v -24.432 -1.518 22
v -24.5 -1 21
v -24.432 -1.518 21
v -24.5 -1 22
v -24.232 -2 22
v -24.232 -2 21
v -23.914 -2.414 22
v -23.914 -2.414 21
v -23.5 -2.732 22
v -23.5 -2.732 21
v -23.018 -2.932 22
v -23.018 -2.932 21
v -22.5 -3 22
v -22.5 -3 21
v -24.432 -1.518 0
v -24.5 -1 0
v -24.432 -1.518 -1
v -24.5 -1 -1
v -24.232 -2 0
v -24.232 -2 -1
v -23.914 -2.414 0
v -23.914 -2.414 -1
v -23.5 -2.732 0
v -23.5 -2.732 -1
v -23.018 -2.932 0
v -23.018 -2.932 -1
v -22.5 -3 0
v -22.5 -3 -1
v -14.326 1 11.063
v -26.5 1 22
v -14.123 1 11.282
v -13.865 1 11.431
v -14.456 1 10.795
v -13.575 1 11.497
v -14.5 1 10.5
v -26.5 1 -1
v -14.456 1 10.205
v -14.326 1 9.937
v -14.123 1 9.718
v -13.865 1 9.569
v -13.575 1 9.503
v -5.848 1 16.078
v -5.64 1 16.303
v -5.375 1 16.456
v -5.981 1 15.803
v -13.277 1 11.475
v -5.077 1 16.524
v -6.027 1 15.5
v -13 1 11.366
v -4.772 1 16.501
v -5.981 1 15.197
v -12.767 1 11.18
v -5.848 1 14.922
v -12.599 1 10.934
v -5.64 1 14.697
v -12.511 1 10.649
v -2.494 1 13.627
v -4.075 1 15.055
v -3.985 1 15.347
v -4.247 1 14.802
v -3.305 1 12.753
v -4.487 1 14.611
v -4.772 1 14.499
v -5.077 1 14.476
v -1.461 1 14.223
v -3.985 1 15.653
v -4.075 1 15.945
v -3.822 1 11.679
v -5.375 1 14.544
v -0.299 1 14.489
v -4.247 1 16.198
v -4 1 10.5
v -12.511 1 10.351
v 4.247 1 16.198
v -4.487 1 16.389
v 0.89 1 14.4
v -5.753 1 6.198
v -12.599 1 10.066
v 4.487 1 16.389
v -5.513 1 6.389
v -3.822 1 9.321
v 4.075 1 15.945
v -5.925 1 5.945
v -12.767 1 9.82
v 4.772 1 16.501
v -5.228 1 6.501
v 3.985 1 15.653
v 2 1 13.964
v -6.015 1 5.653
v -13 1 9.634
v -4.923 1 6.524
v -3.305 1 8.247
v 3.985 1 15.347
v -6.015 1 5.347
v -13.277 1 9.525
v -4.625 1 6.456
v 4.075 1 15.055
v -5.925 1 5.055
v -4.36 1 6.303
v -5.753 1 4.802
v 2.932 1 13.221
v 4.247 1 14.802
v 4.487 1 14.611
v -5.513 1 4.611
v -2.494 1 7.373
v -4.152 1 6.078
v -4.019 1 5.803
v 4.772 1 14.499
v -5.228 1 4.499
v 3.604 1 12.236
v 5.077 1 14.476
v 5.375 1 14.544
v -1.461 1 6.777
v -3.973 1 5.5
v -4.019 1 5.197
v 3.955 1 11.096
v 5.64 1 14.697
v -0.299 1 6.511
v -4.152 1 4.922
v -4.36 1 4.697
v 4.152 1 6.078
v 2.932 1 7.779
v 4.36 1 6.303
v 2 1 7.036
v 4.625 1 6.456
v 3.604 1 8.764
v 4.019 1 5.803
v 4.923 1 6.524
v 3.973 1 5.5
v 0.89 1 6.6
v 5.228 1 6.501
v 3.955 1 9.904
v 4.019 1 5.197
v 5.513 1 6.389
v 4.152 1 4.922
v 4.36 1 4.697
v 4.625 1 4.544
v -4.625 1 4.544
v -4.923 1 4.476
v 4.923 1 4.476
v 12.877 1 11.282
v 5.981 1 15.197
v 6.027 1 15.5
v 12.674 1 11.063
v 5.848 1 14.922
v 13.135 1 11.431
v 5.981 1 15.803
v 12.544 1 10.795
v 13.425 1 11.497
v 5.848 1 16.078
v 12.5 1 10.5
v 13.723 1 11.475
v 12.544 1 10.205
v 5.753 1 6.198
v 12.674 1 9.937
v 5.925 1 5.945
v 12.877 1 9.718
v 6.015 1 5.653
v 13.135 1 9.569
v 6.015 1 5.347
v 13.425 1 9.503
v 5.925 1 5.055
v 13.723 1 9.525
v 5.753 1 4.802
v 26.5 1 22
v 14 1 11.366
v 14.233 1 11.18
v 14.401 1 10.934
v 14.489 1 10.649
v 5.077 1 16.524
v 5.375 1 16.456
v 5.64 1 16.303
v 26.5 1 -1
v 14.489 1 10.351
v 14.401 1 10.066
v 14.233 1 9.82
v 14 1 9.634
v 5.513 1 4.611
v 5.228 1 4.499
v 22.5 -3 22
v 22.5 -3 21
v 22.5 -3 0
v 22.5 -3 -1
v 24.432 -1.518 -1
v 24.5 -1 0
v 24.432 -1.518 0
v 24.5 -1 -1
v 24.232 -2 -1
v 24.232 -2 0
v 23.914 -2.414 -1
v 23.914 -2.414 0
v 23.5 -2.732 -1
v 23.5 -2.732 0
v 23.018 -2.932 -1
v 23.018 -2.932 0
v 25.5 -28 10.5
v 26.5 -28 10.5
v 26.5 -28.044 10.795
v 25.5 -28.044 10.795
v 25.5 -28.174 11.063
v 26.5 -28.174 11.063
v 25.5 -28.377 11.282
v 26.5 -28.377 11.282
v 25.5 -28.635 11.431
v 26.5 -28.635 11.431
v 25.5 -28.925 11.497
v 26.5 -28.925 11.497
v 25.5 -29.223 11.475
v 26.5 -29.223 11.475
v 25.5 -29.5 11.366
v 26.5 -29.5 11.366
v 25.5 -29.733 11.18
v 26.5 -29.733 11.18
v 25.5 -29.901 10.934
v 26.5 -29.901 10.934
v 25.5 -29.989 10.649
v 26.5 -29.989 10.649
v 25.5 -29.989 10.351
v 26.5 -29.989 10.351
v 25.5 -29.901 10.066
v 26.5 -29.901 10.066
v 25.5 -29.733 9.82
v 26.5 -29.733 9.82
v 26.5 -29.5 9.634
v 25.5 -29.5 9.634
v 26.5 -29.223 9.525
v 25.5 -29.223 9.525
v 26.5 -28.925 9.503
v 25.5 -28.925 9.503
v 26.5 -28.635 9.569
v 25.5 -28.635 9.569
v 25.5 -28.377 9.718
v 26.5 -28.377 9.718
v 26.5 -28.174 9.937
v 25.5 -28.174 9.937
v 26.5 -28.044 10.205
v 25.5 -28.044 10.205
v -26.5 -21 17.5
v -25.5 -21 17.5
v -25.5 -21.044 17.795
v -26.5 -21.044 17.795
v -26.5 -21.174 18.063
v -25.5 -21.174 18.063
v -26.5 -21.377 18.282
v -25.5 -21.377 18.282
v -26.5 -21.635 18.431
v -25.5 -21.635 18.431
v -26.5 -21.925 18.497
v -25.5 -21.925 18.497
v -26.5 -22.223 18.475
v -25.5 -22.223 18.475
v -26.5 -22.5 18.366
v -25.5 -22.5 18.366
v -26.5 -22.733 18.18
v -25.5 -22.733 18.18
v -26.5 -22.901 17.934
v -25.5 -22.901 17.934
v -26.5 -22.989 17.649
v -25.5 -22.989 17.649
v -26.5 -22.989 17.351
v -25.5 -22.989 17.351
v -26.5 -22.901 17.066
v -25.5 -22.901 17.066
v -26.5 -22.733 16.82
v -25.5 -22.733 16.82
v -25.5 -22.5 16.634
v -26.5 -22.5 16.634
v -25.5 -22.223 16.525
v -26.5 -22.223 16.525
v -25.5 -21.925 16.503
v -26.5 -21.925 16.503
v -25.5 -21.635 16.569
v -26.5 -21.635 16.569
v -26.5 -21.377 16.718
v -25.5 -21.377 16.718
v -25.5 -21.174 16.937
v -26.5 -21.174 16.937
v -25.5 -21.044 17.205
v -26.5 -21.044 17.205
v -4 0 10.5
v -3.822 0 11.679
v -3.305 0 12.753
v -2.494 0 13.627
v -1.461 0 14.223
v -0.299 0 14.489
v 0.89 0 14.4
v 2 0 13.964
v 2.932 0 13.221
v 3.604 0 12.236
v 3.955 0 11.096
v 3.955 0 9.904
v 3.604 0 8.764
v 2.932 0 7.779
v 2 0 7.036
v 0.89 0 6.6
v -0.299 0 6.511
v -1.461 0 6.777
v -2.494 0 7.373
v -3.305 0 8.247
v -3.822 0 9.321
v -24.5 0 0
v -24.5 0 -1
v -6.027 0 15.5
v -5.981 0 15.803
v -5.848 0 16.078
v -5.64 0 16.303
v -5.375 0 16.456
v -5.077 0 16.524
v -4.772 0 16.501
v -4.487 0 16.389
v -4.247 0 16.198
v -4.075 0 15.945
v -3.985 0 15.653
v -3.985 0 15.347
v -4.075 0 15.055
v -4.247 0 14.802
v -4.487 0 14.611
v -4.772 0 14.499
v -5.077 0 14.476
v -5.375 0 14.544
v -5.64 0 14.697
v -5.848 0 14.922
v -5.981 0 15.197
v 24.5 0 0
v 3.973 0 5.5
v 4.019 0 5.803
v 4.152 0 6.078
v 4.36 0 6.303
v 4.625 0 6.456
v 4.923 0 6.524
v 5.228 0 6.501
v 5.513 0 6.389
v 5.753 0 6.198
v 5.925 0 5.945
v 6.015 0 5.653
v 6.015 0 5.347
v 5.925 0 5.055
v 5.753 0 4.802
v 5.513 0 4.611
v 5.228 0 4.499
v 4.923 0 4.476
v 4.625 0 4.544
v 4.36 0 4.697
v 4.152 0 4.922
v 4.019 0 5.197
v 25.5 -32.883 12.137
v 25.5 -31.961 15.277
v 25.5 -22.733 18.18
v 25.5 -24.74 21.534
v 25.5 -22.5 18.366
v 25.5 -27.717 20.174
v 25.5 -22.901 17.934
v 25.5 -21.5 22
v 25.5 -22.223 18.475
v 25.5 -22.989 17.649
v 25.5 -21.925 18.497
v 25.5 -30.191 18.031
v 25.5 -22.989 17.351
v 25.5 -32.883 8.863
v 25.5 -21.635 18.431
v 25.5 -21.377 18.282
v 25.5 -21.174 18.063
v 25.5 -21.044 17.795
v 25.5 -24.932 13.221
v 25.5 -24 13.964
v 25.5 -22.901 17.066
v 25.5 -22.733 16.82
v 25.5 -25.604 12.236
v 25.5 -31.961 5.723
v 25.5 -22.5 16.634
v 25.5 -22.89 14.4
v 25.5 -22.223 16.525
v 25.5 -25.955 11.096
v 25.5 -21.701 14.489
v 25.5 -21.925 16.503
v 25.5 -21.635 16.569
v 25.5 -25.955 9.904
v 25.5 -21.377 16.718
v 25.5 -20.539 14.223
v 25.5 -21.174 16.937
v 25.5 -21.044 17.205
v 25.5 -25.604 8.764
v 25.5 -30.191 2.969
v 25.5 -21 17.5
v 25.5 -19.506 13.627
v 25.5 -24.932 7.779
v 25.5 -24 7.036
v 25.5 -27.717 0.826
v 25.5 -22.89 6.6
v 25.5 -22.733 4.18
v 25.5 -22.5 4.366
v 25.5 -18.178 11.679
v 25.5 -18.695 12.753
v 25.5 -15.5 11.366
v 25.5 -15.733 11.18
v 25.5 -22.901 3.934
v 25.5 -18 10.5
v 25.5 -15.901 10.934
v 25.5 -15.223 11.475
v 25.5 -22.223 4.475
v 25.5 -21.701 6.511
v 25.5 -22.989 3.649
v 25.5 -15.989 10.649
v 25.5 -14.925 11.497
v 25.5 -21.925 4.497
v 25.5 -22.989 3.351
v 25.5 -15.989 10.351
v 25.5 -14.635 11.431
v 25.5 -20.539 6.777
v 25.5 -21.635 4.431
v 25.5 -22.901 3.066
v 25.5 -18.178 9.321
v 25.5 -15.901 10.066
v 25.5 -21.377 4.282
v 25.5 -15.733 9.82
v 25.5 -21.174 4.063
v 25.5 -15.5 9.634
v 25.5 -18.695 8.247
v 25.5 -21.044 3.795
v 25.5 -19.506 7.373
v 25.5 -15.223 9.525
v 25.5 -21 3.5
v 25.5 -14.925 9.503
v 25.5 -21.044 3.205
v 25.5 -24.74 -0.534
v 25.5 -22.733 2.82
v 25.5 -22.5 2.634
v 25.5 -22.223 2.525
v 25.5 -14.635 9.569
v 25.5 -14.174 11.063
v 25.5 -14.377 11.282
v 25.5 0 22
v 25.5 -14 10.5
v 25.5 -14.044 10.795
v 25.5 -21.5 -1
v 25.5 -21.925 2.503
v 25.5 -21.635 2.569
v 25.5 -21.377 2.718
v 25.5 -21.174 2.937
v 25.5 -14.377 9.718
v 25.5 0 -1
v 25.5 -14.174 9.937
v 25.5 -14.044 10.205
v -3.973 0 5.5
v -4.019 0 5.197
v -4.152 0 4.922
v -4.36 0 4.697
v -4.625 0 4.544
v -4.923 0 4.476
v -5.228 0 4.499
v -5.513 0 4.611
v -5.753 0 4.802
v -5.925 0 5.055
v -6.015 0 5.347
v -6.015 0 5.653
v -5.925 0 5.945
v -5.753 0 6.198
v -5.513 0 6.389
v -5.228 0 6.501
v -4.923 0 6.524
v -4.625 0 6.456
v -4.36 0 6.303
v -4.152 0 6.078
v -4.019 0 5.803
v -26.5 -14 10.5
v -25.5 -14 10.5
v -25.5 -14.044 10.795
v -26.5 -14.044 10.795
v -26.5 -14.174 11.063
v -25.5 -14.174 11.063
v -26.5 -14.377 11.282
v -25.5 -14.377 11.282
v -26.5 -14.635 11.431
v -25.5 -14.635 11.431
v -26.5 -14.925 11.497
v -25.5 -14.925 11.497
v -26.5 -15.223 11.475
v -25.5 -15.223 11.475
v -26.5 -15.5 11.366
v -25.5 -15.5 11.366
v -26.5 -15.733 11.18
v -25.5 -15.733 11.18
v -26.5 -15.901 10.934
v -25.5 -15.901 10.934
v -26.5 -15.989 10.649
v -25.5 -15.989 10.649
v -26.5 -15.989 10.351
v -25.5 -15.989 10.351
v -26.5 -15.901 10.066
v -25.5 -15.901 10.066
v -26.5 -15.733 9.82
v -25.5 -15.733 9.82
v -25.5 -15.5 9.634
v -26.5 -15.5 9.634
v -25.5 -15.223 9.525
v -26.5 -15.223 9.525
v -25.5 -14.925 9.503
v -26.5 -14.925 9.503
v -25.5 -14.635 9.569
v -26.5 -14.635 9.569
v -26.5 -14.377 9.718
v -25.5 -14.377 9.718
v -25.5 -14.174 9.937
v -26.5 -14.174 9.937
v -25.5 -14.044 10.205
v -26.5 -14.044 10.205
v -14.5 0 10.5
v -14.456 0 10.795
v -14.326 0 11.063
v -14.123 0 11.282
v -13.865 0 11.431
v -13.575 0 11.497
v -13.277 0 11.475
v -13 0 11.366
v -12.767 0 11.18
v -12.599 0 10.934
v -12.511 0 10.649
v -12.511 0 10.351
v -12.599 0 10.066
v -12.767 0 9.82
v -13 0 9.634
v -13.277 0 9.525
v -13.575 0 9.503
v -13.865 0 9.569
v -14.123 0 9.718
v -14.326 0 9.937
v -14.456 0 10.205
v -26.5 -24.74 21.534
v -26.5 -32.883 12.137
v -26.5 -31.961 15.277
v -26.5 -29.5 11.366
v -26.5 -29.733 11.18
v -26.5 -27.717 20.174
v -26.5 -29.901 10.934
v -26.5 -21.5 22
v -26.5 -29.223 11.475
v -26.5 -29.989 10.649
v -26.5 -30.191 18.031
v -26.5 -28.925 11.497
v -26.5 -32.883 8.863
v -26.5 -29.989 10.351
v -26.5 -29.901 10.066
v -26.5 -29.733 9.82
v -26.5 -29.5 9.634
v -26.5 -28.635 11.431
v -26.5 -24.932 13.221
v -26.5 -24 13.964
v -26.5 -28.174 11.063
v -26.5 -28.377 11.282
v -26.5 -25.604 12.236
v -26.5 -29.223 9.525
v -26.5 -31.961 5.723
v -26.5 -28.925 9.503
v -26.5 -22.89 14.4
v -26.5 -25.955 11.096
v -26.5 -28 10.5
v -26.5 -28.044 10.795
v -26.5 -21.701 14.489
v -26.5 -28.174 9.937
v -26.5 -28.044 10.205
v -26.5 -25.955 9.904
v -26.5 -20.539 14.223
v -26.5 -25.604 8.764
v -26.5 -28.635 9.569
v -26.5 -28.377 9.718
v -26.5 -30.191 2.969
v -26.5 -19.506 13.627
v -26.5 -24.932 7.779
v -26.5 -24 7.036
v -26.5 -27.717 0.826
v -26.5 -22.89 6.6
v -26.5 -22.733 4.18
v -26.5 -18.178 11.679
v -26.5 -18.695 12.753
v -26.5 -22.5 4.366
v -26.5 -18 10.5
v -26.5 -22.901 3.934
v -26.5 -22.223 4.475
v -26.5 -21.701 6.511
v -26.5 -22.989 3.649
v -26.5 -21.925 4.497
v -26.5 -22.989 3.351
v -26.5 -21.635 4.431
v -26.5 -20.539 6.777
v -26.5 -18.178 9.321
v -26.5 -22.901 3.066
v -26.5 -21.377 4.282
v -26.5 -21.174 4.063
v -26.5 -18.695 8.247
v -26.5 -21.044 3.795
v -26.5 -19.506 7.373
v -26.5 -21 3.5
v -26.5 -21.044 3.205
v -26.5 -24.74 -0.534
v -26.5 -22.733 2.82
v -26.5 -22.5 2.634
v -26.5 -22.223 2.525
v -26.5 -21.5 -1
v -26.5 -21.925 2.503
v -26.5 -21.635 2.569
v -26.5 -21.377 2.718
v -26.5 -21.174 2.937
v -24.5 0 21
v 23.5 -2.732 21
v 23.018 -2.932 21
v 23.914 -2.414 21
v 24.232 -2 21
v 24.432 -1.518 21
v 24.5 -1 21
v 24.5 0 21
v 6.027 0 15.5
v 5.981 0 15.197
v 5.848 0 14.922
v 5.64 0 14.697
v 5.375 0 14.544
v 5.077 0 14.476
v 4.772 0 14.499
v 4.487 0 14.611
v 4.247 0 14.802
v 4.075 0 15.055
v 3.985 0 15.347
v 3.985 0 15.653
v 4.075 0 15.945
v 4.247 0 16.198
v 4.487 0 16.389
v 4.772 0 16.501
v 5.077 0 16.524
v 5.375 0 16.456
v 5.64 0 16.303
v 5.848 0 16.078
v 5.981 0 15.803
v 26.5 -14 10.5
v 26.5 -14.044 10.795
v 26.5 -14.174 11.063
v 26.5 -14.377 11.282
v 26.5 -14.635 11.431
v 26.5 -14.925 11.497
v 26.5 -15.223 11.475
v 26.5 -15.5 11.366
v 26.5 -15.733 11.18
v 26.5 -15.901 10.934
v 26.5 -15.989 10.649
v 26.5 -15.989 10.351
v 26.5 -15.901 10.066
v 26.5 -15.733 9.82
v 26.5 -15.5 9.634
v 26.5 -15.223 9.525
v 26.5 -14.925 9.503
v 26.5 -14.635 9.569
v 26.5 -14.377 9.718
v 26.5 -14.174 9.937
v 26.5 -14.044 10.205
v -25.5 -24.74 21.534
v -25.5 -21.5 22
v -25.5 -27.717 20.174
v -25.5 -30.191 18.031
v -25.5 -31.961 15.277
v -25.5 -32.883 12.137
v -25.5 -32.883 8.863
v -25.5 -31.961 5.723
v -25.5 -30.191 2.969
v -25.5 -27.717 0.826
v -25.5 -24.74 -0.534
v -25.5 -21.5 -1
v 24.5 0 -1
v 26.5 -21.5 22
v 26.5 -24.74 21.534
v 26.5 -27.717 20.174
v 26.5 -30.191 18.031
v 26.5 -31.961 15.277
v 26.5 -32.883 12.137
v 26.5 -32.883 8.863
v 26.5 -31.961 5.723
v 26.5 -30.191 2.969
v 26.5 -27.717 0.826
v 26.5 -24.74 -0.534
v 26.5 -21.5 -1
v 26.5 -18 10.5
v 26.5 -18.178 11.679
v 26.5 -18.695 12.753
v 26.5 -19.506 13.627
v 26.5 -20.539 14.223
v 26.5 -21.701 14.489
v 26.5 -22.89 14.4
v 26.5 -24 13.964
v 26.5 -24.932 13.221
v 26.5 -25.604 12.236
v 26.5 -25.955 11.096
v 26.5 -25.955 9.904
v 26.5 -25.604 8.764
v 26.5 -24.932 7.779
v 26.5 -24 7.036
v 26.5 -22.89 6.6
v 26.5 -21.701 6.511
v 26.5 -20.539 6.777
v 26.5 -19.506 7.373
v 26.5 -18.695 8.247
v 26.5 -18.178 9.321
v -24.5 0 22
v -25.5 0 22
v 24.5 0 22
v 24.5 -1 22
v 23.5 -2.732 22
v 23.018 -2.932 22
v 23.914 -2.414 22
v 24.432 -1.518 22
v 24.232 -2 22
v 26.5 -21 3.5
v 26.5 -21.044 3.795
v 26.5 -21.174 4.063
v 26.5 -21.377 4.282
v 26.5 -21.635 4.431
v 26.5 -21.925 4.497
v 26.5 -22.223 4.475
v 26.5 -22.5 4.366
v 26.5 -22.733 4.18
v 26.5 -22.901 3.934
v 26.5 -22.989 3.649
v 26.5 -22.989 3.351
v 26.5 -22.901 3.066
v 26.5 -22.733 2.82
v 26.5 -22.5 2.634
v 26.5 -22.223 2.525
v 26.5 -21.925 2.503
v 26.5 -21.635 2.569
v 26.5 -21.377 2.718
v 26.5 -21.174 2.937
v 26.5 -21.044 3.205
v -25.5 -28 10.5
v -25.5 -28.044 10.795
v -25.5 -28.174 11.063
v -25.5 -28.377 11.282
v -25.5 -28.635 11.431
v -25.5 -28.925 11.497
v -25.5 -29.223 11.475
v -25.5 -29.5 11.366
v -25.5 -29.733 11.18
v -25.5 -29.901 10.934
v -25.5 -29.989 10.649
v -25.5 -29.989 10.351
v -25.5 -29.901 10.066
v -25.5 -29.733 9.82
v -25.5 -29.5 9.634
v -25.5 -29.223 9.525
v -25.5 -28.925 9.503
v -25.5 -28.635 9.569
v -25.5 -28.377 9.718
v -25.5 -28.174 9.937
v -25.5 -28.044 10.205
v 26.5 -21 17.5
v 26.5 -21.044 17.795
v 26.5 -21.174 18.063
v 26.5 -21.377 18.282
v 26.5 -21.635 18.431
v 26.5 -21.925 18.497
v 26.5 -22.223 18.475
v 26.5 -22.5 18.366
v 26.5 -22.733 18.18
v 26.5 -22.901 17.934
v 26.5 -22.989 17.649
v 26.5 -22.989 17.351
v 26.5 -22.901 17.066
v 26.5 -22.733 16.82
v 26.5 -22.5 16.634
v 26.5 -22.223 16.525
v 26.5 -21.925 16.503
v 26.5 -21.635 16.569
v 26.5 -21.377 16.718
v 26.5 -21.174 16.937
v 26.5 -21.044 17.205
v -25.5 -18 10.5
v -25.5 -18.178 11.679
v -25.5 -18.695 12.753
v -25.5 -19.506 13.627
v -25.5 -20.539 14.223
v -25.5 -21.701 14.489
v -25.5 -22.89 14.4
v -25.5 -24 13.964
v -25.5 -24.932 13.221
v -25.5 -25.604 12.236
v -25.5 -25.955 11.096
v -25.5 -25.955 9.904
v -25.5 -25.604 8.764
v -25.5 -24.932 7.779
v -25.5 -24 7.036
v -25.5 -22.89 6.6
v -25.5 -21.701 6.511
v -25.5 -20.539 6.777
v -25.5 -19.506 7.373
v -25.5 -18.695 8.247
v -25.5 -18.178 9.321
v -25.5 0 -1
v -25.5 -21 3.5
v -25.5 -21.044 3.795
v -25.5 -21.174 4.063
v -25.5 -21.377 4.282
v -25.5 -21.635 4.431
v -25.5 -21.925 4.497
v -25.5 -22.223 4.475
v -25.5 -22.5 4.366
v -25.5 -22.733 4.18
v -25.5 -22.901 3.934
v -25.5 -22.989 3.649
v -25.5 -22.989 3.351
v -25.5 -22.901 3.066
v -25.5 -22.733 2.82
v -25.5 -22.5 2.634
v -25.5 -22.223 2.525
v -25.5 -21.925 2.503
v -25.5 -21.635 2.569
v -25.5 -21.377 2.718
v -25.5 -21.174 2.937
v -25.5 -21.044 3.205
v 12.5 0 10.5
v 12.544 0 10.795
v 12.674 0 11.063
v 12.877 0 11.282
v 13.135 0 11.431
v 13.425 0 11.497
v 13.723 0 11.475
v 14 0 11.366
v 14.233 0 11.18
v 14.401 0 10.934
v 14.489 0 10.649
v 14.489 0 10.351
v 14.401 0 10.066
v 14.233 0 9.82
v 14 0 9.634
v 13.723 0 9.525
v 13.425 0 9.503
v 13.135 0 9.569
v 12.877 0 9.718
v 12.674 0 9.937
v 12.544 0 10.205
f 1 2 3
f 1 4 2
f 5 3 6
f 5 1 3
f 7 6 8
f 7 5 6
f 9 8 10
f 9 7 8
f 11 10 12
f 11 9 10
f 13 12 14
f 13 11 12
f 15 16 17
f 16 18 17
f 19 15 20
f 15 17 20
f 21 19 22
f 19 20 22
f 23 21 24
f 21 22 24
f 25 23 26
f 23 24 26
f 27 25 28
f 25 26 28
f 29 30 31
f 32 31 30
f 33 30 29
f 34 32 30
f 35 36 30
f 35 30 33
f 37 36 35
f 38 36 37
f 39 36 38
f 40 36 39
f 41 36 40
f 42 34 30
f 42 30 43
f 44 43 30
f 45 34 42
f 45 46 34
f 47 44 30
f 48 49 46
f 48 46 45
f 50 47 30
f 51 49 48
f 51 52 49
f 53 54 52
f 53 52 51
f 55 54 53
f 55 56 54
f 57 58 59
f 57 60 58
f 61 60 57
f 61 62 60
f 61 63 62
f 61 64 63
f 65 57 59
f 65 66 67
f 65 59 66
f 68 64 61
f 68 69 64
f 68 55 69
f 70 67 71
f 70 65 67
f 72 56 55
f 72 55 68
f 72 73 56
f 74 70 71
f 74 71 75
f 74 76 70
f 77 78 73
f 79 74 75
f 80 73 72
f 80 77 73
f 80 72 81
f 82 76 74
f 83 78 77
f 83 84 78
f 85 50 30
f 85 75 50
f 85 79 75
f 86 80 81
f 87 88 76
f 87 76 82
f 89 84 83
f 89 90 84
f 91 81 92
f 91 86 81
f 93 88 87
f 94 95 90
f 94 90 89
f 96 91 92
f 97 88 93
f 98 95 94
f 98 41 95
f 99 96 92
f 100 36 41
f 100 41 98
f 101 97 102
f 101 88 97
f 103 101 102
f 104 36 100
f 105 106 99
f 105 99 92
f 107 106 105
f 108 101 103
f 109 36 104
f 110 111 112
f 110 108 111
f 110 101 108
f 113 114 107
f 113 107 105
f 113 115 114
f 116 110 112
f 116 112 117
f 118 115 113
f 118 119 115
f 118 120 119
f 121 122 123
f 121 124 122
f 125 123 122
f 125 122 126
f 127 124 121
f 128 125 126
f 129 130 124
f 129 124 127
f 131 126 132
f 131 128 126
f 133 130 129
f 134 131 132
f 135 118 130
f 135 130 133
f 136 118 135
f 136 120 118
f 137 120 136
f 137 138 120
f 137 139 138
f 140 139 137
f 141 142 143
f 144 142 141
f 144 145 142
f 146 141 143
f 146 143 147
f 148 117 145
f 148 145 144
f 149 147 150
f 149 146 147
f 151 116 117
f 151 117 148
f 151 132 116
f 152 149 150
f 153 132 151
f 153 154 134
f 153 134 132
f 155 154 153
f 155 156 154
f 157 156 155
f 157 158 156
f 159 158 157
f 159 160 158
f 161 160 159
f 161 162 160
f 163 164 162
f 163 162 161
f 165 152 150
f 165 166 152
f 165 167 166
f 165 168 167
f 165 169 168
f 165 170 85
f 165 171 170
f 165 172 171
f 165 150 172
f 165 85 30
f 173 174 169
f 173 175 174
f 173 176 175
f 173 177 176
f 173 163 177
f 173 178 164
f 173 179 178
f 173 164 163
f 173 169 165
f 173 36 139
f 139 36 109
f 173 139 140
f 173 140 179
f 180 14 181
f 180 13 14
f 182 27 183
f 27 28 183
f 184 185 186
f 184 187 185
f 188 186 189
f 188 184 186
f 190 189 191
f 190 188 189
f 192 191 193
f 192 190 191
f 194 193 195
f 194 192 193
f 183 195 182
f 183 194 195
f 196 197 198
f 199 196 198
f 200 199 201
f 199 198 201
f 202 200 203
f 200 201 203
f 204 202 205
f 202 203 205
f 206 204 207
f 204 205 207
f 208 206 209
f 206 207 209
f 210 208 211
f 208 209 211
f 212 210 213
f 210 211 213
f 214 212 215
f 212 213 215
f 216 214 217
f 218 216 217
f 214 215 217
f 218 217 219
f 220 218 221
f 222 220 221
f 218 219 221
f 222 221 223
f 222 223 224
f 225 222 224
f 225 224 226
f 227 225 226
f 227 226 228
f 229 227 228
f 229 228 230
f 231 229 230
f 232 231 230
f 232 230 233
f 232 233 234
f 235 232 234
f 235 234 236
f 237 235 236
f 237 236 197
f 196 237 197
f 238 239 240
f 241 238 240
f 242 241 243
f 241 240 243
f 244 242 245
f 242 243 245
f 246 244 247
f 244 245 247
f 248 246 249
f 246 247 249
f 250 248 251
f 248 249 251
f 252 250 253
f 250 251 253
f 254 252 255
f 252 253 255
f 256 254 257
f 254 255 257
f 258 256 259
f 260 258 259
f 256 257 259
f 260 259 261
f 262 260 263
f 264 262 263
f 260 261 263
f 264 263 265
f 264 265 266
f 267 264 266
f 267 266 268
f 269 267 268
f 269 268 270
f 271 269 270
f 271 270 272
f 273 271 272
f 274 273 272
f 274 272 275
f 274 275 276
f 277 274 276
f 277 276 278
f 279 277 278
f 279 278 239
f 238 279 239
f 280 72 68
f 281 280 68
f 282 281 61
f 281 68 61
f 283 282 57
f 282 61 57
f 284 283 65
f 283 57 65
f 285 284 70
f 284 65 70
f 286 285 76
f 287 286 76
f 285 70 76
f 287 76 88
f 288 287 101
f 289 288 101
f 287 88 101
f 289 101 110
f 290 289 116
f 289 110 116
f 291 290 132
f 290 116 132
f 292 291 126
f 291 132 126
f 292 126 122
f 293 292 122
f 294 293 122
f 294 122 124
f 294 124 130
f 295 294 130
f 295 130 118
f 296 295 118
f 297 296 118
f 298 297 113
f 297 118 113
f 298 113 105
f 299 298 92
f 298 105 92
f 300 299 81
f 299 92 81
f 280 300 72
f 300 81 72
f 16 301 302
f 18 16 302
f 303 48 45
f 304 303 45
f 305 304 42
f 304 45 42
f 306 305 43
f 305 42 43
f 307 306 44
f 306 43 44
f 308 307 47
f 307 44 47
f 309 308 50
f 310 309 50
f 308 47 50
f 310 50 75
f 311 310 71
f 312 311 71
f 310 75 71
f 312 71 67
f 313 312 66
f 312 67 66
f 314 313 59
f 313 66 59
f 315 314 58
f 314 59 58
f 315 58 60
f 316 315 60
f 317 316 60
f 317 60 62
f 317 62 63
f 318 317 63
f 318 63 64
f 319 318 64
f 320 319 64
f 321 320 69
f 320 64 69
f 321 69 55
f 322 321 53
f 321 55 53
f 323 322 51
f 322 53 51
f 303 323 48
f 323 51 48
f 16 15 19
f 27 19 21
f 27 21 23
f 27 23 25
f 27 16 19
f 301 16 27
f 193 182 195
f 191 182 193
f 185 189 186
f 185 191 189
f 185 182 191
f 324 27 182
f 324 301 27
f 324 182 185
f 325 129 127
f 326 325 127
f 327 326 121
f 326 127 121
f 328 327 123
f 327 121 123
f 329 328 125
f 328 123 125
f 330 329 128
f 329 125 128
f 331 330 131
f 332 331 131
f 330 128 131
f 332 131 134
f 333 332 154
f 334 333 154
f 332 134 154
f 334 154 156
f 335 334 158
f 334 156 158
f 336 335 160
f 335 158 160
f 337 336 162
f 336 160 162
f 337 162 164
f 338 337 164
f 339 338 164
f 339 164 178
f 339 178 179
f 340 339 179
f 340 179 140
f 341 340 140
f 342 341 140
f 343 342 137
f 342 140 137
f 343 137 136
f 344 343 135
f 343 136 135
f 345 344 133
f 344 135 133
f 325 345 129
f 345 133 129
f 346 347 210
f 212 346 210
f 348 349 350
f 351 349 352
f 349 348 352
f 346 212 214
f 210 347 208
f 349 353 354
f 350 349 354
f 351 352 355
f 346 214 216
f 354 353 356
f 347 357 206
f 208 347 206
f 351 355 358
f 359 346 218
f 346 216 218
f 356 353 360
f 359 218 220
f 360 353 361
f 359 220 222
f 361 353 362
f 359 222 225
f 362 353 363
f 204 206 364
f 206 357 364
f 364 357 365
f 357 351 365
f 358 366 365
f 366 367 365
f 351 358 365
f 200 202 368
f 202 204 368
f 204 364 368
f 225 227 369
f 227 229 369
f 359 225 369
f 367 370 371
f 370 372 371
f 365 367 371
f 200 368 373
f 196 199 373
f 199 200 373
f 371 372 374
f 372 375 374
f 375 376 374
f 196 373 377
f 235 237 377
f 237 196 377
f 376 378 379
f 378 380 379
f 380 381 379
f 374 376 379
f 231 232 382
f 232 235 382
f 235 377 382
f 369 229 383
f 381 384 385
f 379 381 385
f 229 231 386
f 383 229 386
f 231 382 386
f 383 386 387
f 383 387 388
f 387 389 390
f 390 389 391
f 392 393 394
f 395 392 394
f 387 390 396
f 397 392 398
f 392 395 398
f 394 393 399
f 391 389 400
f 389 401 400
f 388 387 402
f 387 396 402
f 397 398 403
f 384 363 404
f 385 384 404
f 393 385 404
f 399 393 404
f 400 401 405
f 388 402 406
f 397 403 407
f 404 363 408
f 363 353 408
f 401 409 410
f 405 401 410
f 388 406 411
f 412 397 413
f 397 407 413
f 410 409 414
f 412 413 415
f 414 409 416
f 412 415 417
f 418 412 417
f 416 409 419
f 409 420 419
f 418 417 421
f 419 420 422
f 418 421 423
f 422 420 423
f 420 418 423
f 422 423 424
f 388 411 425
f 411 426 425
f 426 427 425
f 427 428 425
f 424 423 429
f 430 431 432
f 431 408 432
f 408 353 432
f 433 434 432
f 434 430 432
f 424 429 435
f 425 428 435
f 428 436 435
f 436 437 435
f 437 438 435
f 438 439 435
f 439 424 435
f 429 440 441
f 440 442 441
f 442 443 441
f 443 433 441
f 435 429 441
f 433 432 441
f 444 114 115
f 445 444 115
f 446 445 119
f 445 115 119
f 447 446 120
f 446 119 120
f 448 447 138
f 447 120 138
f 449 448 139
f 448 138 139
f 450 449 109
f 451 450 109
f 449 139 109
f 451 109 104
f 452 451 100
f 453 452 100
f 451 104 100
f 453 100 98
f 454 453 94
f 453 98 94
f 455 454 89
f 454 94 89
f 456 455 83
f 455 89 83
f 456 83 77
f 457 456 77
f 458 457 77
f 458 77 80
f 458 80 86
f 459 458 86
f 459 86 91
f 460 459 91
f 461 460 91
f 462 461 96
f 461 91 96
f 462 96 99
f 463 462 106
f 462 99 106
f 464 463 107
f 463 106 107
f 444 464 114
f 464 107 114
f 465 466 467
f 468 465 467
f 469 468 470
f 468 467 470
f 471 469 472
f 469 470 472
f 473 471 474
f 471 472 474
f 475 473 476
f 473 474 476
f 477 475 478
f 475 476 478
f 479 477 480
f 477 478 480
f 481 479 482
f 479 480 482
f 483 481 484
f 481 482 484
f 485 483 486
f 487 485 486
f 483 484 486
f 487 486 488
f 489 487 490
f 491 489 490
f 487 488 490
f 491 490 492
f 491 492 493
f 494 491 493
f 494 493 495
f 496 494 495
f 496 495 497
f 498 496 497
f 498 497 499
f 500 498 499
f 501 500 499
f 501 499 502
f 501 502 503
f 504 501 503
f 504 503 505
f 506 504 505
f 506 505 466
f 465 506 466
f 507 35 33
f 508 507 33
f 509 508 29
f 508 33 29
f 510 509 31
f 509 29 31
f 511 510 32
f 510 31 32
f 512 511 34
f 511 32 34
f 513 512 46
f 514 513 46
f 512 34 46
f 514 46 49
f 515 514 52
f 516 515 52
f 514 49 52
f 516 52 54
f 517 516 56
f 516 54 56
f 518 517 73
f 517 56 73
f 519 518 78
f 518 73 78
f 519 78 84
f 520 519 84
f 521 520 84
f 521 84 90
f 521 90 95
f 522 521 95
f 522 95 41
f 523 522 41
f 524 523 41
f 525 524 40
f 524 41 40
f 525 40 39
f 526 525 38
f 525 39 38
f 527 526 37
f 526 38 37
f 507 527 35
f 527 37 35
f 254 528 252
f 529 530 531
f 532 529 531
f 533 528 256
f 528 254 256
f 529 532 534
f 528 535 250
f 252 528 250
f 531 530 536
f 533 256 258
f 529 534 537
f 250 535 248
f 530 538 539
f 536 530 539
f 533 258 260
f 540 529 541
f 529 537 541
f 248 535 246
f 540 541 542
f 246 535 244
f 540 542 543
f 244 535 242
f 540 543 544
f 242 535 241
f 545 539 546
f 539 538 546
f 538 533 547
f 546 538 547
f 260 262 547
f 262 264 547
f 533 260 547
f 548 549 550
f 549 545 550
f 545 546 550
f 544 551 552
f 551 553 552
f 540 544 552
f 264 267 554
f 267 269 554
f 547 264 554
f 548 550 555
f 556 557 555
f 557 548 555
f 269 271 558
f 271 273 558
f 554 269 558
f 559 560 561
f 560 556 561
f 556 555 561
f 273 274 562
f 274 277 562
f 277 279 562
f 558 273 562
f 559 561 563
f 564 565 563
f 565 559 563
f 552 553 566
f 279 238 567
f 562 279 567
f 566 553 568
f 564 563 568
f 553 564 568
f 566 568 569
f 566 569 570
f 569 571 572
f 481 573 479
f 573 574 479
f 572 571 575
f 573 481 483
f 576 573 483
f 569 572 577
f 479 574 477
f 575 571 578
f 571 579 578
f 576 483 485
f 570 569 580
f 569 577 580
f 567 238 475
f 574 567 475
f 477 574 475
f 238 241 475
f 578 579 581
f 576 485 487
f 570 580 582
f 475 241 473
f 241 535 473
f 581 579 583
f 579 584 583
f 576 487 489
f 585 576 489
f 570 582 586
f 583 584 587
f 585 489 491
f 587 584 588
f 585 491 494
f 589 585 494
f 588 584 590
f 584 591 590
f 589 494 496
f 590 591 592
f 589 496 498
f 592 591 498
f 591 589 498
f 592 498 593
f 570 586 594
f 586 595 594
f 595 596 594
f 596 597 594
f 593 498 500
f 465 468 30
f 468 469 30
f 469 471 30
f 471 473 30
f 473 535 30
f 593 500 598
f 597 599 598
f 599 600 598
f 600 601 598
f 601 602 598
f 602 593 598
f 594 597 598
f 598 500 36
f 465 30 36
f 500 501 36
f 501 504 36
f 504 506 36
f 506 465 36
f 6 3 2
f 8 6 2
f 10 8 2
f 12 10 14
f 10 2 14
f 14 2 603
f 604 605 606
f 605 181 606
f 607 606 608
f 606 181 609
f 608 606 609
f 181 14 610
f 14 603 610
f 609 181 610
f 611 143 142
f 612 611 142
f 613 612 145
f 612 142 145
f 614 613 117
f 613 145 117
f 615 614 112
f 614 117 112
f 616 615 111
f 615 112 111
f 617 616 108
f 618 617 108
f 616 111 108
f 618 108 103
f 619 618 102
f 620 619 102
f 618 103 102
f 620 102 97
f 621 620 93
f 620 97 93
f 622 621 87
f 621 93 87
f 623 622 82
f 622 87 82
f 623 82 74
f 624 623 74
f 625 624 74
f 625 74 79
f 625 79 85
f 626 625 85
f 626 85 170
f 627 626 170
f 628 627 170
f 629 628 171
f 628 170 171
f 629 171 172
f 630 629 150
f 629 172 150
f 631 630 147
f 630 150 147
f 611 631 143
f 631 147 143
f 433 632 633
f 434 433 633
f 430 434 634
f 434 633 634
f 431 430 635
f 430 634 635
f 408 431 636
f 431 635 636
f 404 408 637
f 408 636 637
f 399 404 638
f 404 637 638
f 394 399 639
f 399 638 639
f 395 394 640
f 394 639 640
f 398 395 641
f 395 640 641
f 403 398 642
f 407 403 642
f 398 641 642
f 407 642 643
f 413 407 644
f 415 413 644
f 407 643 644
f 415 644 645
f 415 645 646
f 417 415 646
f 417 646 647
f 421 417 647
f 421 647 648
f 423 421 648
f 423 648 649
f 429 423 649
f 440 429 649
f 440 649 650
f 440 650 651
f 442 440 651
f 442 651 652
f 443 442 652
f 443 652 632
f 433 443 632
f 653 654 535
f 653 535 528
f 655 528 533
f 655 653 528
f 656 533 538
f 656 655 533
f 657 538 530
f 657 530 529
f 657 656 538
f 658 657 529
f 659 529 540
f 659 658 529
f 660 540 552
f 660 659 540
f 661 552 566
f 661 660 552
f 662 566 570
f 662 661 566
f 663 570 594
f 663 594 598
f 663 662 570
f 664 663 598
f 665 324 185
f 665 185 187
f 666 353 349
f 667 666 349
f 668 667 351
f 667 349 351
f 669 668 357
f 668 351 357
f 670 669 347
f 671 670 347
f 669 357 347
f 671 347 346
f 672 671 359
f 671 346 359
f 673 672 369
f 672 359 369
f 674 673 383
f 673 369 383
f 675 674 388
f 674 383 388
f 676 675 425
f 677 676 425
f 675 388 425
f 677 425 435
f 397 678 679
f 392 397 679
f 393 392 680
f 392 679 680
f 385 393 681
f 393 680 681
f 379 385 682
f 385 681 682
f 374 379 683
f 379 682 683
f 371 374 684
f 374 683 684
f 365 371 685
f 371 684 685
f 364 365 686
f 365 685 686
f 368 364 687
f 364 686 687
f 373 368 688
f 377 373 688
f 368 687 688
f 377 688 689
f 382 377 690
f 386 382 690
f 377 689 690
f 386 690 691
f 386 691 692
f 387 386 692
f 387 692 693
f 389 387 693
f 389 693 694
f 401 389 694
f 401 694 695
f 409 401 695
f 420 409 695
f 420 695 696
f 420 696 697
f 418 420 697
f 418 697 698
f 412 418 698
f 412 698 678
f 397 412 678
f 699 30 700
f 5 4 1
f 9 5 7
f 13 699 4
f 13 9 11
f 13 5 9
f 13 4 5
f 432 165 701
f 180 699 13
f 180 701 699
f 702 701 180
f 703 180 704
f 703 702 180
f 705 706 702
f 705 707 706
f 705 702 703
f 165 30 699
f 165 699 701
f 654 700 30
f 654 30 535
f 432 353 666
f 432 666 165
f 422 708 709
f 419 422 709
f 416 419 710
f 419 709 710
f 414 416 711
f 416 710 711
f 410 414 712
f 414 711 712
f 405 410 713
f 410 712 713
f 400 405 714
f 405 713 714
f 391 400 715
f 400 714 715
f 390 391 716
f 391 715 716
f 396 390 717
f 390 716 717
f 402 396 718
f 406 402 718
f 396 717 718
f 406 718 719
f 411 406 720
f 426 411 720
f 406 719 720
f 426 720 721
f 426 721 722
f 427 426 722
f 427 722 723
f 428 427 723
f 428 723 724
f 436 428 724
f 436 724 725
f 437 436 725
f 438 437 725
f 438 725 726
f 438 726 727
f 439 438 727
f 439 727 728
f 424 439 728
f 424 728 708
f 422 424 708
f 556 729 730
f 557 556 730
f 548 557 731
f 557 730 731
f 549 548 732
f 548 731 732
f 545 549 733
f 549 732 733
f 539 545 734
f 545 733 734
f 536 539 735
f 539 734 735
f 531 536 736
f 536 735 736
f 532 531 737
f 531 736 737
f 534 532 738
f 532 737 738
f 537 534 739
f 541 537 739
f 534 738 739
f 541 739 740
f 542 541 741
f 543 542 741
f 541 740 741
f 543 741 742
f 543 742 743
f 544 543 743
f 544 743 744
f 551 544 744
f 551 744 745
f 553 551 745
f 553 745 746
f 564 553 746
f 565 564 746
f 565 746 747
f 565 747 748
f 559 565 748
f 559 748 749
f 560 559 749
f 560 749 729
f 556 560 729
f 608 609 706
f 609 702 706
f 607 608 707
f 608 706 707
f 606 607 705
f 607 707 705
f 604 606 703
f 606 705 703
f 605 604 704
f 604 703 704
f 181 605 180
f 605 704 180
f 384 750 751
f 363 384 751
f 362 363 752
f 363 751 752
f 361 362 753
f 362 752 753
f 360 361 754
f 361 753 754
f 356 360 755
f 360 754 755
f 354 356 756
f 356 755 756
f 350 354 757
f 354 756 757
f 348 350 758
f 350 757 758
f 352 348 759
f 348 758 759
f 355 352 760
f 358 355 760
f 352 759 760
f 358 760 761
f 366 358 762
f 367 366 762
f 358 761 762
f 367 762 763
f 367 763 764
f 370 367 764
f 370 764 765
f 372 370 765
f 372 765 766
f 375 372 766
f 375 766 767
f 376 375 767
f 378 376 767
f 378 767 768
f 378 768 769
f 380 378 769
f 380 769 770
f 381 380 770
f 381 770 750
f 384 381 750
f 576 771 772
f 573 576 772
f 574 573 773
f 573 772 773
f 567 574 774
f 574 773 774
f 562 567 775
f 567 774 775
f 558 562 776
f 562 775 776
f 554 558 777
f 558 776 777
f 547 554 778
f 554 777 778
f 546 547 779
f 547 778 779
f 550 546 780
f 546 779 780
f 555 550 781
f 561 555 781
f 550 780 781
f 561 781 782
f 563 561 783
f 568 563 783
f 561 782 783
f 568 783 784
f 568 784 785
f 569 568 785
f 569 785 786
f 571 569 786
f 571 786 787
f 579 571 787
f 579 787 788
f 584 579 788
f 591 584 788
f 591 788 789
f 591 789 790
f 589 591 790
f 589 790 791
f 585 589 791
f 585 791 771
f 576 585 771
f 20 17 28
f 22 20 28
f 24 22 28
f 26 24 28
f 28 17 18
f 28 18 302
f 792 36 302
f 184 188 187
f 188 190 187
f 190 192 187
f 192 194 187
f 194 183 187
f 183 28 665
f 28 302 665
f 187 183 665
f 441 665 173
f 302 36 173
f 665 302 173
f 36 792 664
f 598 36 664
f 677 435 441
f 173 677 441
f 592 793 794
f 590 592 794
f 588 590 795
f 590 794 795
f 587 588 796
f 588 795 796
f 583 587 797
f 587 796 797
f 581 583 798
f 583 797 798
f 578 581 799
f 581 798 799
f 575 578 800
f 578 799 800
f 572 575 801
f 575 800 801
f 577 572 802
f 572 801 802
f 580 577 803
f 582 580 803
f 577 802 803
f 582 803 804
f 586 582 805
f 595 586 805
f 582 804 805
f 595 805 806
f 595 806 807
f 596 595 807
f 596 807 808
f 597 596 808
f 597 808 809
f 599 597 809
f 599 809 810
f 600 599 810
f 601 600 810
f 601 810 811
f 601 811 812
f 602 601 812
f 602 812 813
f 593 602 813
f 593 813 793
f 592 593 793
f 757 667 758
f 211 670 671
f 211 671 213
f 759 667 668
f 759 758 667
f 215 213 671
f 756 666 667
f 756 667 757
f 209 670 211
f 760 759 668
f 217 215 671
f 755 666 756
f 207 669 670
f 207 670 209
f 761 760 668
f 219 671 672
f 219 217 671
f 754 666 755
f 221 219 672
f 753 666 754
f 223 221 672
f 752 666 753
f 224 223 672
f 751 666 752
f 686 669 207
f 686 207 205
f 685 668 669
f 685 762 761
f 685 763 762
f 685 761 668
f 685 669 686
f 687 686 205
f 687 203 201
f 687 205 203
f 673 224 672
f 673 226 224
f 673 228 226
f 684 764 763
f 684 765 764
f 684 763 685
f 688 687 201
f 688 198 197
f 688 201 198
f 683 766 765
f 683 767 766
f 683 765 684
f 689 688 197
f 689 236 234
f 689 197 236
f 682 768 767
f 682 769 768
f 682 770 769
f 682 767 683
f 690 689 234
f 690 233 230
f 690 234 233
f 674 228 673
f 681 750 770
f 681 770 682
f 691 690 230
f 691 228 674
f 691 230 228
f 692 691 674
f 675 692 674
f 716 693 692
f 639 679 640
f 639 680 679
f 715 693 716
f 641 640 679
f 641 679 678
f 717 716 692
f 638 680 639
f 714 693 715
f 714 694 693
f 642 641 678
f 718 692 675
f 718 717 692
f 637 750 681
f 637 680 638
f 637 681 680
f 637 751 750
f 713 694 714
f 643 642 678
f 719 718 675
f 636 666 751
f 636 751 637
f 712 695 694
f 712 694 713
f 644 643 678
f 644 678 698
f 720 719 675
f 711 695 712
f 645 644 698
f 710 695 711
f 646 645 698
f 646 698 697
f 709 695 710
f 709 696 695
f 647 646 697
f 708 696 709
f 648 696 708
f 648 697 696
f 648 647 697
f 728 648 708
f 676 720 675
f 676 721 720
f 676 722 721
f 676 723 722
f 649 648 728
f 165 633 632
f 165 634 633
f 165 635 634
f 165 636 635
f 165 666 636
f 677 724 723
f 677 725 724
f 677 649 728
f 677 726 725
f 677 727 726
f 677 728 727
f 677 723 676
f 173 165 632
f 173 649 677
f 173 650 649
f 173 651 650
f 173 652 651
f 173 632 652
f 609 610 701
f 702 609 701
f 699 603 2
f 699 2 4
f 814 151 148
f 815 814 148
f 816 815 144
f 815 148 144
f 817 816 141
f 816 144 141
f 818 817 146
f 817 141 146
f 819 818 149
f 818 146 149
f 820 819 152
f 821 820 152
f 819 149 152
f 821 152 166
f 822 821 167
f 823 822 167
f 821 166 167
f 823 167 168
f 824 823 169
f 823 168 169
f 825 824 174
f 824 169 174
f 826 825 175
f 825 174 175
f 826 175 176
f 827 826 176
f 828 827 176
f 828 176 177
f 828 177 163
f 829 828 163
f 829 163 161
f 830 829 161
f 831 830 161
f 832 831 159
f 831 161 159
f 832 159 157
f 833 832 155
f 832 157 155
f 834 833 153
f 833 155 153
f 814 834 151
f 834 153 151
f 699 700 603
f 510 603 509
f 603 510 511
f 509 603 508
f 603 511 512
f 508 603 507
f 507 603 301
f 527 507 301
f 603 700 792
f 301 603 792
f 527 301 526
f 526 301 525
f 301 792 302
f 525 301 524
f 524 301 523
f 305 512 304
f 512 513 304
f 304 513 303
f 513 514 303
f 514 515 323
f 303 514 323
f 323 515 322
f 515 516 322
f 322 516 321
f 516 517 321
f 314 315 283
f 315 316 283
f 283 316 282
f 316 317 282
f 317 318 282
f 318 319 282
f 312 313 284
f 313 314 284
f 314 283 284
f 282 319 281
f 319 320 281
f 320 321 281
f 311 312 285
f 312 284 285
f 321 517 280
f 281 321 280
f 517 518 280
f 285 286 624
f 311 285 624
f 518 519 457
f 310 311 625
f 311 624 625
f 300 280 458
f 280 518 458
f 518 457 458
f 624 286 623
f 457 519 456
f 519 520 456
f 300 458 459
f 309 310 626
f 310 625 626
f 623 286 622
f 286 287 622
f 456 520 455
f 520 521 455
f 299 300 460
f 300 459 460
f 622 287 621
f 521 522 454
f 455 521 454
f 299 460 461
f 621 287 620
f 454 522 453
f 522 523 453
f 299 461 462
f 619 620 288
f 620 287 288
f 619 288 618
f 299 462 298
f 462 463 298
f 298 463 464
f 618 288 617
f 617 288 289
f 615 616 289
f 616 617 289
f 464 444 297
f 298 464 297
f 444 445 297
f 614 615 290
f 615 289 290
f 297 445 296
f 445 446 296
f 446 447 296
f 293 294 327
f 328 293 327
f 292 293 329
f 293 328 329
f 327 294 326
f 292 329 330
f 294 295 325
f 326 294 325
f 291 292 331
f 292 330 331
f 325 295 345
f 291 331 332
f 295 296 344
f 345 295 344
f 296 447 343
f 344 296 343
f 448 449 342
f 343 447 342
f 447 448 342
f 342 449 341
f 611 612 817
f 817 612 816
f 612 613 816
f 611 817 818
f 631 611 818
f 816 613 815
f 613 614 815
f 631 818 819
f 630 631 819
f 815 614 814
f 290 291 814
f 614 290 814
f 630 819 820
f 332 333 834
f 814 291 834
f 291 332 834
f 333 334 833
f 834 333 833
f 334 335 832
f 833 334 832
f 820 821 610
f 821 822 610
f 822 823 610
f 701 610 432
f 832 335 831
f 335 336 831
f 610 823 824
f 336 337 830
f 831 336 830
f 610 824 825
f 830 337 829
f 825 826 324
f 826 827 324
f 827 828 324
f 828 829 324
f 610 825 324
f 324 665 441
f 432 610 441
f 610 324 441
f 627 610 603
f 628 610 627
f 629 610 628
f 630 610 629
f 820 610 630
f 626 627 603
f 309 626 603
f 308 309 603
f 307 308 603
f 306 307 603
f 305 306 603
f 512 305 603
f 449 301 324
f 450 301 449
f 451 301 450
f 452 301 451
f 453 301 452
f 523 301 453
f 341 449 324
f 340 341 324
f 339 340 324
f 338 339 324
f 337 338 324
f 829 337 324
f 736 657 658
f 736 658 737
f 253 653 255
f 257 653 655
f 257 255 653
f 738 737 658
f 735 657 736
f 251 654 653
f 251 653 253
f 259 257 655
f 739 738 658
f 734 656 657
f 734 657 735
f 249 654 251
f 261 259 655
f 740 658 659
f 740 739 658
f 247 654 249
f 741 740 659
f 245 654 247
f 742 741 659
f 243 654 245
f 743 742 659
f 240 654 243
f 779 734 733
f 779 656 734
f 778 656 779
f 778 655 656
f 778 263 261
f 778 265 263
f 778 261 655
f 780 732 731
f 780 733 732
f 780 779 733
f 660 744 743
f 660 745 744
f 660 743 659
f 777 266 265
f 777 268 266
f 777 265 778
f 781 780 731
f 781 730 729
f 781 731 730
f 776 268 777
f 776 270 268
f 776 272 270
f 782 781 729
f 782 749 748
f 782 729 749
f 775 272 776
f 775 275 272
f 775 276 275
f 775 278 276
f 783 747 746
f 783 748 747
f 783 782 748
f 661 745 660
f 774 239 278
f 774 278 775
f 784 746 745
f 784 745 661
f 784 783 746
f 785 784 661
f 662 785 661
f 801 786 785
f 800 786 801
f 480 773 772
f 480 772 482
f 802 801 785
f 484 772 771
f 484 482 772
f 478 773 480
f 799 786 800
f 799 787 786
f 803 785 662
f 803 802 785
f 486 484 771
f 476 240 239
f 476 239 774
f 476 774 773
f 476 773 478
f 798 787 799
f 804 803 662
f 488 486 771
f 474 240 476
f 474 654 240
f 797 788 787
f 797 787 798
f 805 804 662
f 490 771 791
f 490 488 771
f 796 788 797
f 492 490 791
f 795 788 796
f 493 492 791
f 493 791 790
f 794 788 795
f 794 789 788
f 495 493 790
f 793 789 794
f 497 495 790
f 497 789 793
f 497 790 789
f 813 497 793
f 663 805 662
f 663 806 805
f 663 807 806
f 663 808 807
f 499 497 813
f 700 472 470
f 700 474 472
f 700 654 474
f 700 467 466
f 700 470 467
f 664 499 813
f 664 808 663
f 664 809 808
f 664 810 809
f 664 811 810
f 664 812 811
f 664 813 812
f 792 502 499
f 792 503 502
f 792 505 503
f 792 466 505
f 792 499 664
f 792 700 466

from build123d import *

# Parameters (mm, degrees)
EXTRUDE_1_DEPTH        = 21
CUT_EXTRUDE_1_REACH    = 67.376
CUT_EXTRUDE_2_REACH    = 67.376
SKETCH_3_R             = 4
SKETCH_3_R_2           = 1
SKETCH_4_R             = 4
SKETCH_4_R_2           = 1.026612686
SKETCH_4_R_3           = 1
CUT_EXTRUDE_3_DEPTH    = 1
SKETCH_6_W             = 49
SKETCH_6_H             = 1
EXTRUDE_2_DEPTH        = 1
SKETCH_7_W             = 49
SKETCH_7_H             = 1
EXTRUDE_3_DEPTH        = 3
FILLET_1_R             = 2
FILLET_1_OF_MIRROR_3_R = 2
EXTRUDE_START          = -1
EXTRUDE_4_DEPTH        = 1
SKETCH_10_W            = 1
SKETCH_10_H            = 1
EXTRUDE_5_DEPTH        = 1


with BuildPart() as part:
    # 草图1 → 凸台-拉伸1 (new body)
    with BuildSketch(Plane.XY):
        Polygon((-26.5, 1), (-26.5, -32), (-25.5, -32), (-25.5, 0), (25.5, 0), (25.5, -32), (26.5, -32), (26.5, 1), align=None)
    extrude(amount=EXTRUDE_1_DEPTH)

    # 切除-拉伸1: up to this face of the body (flat: up to its plane)
    cut_extrude_1_end = Plane(part.part.faces().sort_by_distance((26.5, -15.5, 10.5))[0])
    # 草图2 → 切除-拉伸1 (cut, up to the picked face)
    with BuildSketch(Plane.ZY.offset(26.5), mode=Mode.PRIVATE) as cut_extrude_1_sk1:
        with BuildLine():
            Line((0, -32), (10.5, -32))
            ThreePointArc((10.5, -32), (3.075378798, -28.924621202), (0, -21.5))
            Line((0, -21.5), (0, -32))
        make_face()
    cut_extrude_1_tool1 = split(extrude(cut_extrude_1_sk1.sketch, amount=-CUT_EXTRUDE_1_REACH, mode=Mode.PRIVATE), bisect_by=cut_extrude_1_end, keep=Keep.BOTH, mode=Mode.PRIVATE)
    cut_extrude_1 = cut_extrude_1_tool1.solids().sort_by(Axis((-26.5, -29.654637, 2.345363), (1, 0, 0)))[0]
    add(cut_extrude_1, mode=Mode.SUBTRACT)

    # 镜向1: 切除-拉伸1 across plane
    add(cut_extrude_1.mirror(Plane.XY.offset(10.5)), mode=Mode.SUBTRACT)

    # 切除-拉伸2: up to this face of the body (flat: up to its plane)
    cut_extrude_2_end = Plane(part.part.faces().sort_by_distance((-26.5, -14.462654994, 10.5))[0])
    # 草图3 → 切除-拉伸2 (cut, up to the picked face)
    with BuildSketch(Plane(origin=(26.5, 0, 0), x_dir=(0, 0, -1), z_dir=(1, 0, 0)), mode=Mode.PRIVATE) as cut_extrude_2_sk1:
        with Locations(Location((-10.5, -22, 0), (0, 0, 90))):
            Circle(SKETCH_3_R)
    cut_extrude_2_tool1 = split(extrude(cut_extrude_2_sk1.sketch, amount=-CUT_EXTRUDE_2_REACH, mode=Mode.PRIVATE), bisect_by=cut_extrude_2_end, keep=Keep.BOTH, mode=Mode.PRIVATE)
    # 草图3 → 切除-拉伸2 (cut, up to the picked face)
    with BuildSketch(Plane(origin=(26.5, 0, 0), x_dir=(0, 0, -1), z_dir=(1, 0, 0)), mode=Mode.PRIVATE) as cut_extrude_2_sk2:
        with Locations(Location((-3.5, -22, 0), (0, 0, 90))):
            Circle(SKETCH_3_R_2)
    cut_extrude_2_tool2 = split(extrude(cut_extrude_2_sk2.sketch, amount=-CUT_EXTRUDE_2_REACH, mode=Mode.PRIVATE), bisect_by=cut_extrude_2_end, keep=Keep.BOTH, mode=Mode.PRIVATE)
    # 草图3 → 切除-拉伸2 (cut, up to the picked face)
    with BuildSketch(Plane(origin=(26.5, 0, 0), x_dir=(0, 0, -1), z_dir=(1, 0, 0)), mode=Mode.PRIVATE) as cut_extrude_2_sk3:
        with Locations(Location((-10.5, -15, 0), (0, 0, 90))):
            Circle(SKETCH_3_R_2)
    cut_extrude_2_tool3 = split(extrude(cut_extrude_2_sk3.sketch, amount=-CUT_EXTRUDE_2_REACH, mode=Mode.PRIVATE), bisect_by=cut_extrude_2_end, keep=Keep.BOTH, mode=Mode.PRIVATE)
    # 草图3 → 切除-拉伸2 (cut, up to the picked face)
    with BuildSketch(Plane(origin=(26.5, 0, 0), x_dir=(0, 0, -1), z_dir=(1, 0, 0)), mode=Mode.PRIVATE) as cut_extrude_2_sk4:
        with Locations(Location((-17.5, -22, 0), (0, 0, 90))):
            Circle(SKETCH_3_R_2)
    cut_extrude_2_tool4 = split(extrude(cut_extrude_2_sk4.sketch, amount=-CUT_EXTRUDE_2_REACH, mode=Mode.PRIVATE), bisect_by=cut_extrude_2_end, keep=Keep.BOTH, mode=Mode.PRIVATE)
    # 草图3 → 切除-拉伸2 (cut, up to the picked face)
    with BuildSketch(Plane(origin=(26.5, 0, 0), x_dir=(0, 0, -1), z_dir=(1, 0, 0)), mode=Mode.PRIVATE) as cut_extrude_2_sk5:
        with Locations(Location((-10.5, -29, 0), (0, 0, 90))):
            Circle(SKETCH_3_R_2)
    cut_extrude_2_tool5 = split(extrude(cut_extrude_2_sk5.sketch, amount=-CUT_EXTRUDE_2_REACH, mode=Mode.PRIVATE), bisect_by=cut_extrude_2_end, keep=Keep.BOTH, mode=Mode.PRIVATE)
    add(cut_extrude_2_tool1.solids().sort_by(Axis((26.5, -22, 10.5), (-1, 0, 0)))[0], mode=Mode.SUBTRACT)
    add(cut_extrude_2_tool2.solids().sort_by(Axis((26.5, -22, 3.5), (-1, 0, 0)))[0], mode=Mode.SUBTRACT)
    add(cut_extrude_2_tool3.solids().sort_by(Axis((26.5, -15, 10.5), (-1, 0, 0)))[0], mode=Mode.SUBTRACT)
    add(cut_extrude_2_tool4.solids().sort_by(Axis((26.5, -22, 17.5), (-1, 0, 0)))[0], mode=Mode.SUBTRACT)
    add(cut_extrude_2_tool5.solids().sort_by(Axis((26.5, -29, 10.5), (-1, 0, 0)))[0], mode=Mode.SUBTRACT)

    # 草图4 → 切除-拉伸3 (cut)
    with BuildSketch(Plane(origin=(0, 1, 0), x_dir=(1, 0, 0), z_dir=(0, 1, 0))):
        with Locations(Location((0, -10.5, 0), (0, 0, 180))):
            Circle(SKETCH_4_R)
        with Locations(Location((5, -5.5, 0), (0, 0, 180))):
            Circle(SKETCH_4_R_2)
        with Locations(Location((13.5, -10.5, 0), (0, 0, 180))):
            Circle(SKETCH_4_R_3)
        with Locations(Location((-13.5, -10.5, 0), (0, 0, 180))):
            Circle(SKETCH_4_R_3)
        with Locations((5, -15.5)):
            Circle(SKETCH_4_R_2)
        with Locations((-5, -5.5)):
            Circle(SKETCH_4_R_2)
        with Locations(Location((-5, -15.5, 0), (0, 0, 180))):
            Circle(SKETCH_4_R_2)
    extrude(amount=-CUT_EXTRUDE_3_DEPTH, mode=Mode.SUBTRACT)

    # 草图6 → 凸台-拉伸2 (add)
    with BuildSketch(Plane.XY.offset(21)):
        with Locations((0, 0.5)):
            Rectangle(SKETCH_6_W, SKETCH_6_H)
    extrude_2 = extrude(amount=EXTRUDE_2_DEPTH)

    # 草图7 → 凸台-拉伸3 (add)
    with BuildSketch(Plane.XZ):
        with Locations((0, 21.5)):
            Rectangle(SKETCH_7_W, SKETCH_7_H)
    extrude_3 = extrude(amount=EXTRUDE_3_DEPTH)

    # 圆角1
    fillet_1_edges = [part.edges().sort_by_distance(p)[0] for p in [
        (24.5, -3, 21.5),
        (-24.5, -3, 21.5),
    ]]
    fillet(fillet_1_edges, radius=FILLET_1_R)

    # 镜向3: 凸台-拉伸2, 凸台-拉伸3 across plane
    add(extrude_2.mirror(Plane.XY.offset(10.5)))
    add(extrude_3.mirror(Plane.XY.offset(10.5)))

    # 圆角1 of 镜向3
    fillet_1_of_mirror_3_edges = [part.edges().sort_by_distance(p)[0] for p in [
        (24.5, -3, -0.5),
        (-24.5, -3, -0.5),
    ]]
    fillet(fillet_1_of_mirror_3_edges, radius=FILLET_1_OF_MIRROR_3_R)

    # 草图9 → 凸台-拉伸4 (add)
    with BuildSketch(Plane(origin=(26.5, 0, 0), x_dir=(0, 0, -1), z_dir=(1, 0, 0)).offset(EXTRUDE_START)):
        with BuildLine():
            Line((-21, 1), (-22, 1))
            Line((-22, 1), (-22, -21.5))
            ThreePointArc((-22, -21.5), (-10.5, -33), (1, -21.5))
            Line((1, -21.5), (1, 1))
            Line((1, 1), (0, 1))
            Line((0, 1), (0, -21.5))
            ThreePointArc((0, -21.5), (-10.5, -32), (-21, -21.5))
            Line((-21, -21.5), (-21, 1))
        make_face()
    extrude_4 = extrude(amount=EXTRUDE_4_DEPTH)

    # 镜向4: 凸台-拉伸4 across plane
    add(extrude_4.mirror(Plane(origin=(0, 0, 0), x_dir=(0, 0, 1), z_dir=(1, 0, 0))))

    # 草图10 → 凸台-拉伸5 (add)
    with BuildSketch(Plane(origin=(0, 1, 0), x_dir=(1, 0, 0), z_dir=(0, 1, 0))):
        with Locations((-25, 0.5)):
            Rectangle(SKETCH_10_W, SKETCH_10_H)
        with Locations((-25, -21.5)):
            Rectangle(SKETCH_10_W, SKETCH_10_H)
        with Locations((25, 0.5)):
            Rectangle(SKETCH_10_W, SKETCH_10_H)
        with Locations((25, -21.5)):
            Rectangle(SKETCH_10_W, SKETCH_10_H)
    extrude(amount=-EXTRUDE_5_DEPTH)


solid = part.part
